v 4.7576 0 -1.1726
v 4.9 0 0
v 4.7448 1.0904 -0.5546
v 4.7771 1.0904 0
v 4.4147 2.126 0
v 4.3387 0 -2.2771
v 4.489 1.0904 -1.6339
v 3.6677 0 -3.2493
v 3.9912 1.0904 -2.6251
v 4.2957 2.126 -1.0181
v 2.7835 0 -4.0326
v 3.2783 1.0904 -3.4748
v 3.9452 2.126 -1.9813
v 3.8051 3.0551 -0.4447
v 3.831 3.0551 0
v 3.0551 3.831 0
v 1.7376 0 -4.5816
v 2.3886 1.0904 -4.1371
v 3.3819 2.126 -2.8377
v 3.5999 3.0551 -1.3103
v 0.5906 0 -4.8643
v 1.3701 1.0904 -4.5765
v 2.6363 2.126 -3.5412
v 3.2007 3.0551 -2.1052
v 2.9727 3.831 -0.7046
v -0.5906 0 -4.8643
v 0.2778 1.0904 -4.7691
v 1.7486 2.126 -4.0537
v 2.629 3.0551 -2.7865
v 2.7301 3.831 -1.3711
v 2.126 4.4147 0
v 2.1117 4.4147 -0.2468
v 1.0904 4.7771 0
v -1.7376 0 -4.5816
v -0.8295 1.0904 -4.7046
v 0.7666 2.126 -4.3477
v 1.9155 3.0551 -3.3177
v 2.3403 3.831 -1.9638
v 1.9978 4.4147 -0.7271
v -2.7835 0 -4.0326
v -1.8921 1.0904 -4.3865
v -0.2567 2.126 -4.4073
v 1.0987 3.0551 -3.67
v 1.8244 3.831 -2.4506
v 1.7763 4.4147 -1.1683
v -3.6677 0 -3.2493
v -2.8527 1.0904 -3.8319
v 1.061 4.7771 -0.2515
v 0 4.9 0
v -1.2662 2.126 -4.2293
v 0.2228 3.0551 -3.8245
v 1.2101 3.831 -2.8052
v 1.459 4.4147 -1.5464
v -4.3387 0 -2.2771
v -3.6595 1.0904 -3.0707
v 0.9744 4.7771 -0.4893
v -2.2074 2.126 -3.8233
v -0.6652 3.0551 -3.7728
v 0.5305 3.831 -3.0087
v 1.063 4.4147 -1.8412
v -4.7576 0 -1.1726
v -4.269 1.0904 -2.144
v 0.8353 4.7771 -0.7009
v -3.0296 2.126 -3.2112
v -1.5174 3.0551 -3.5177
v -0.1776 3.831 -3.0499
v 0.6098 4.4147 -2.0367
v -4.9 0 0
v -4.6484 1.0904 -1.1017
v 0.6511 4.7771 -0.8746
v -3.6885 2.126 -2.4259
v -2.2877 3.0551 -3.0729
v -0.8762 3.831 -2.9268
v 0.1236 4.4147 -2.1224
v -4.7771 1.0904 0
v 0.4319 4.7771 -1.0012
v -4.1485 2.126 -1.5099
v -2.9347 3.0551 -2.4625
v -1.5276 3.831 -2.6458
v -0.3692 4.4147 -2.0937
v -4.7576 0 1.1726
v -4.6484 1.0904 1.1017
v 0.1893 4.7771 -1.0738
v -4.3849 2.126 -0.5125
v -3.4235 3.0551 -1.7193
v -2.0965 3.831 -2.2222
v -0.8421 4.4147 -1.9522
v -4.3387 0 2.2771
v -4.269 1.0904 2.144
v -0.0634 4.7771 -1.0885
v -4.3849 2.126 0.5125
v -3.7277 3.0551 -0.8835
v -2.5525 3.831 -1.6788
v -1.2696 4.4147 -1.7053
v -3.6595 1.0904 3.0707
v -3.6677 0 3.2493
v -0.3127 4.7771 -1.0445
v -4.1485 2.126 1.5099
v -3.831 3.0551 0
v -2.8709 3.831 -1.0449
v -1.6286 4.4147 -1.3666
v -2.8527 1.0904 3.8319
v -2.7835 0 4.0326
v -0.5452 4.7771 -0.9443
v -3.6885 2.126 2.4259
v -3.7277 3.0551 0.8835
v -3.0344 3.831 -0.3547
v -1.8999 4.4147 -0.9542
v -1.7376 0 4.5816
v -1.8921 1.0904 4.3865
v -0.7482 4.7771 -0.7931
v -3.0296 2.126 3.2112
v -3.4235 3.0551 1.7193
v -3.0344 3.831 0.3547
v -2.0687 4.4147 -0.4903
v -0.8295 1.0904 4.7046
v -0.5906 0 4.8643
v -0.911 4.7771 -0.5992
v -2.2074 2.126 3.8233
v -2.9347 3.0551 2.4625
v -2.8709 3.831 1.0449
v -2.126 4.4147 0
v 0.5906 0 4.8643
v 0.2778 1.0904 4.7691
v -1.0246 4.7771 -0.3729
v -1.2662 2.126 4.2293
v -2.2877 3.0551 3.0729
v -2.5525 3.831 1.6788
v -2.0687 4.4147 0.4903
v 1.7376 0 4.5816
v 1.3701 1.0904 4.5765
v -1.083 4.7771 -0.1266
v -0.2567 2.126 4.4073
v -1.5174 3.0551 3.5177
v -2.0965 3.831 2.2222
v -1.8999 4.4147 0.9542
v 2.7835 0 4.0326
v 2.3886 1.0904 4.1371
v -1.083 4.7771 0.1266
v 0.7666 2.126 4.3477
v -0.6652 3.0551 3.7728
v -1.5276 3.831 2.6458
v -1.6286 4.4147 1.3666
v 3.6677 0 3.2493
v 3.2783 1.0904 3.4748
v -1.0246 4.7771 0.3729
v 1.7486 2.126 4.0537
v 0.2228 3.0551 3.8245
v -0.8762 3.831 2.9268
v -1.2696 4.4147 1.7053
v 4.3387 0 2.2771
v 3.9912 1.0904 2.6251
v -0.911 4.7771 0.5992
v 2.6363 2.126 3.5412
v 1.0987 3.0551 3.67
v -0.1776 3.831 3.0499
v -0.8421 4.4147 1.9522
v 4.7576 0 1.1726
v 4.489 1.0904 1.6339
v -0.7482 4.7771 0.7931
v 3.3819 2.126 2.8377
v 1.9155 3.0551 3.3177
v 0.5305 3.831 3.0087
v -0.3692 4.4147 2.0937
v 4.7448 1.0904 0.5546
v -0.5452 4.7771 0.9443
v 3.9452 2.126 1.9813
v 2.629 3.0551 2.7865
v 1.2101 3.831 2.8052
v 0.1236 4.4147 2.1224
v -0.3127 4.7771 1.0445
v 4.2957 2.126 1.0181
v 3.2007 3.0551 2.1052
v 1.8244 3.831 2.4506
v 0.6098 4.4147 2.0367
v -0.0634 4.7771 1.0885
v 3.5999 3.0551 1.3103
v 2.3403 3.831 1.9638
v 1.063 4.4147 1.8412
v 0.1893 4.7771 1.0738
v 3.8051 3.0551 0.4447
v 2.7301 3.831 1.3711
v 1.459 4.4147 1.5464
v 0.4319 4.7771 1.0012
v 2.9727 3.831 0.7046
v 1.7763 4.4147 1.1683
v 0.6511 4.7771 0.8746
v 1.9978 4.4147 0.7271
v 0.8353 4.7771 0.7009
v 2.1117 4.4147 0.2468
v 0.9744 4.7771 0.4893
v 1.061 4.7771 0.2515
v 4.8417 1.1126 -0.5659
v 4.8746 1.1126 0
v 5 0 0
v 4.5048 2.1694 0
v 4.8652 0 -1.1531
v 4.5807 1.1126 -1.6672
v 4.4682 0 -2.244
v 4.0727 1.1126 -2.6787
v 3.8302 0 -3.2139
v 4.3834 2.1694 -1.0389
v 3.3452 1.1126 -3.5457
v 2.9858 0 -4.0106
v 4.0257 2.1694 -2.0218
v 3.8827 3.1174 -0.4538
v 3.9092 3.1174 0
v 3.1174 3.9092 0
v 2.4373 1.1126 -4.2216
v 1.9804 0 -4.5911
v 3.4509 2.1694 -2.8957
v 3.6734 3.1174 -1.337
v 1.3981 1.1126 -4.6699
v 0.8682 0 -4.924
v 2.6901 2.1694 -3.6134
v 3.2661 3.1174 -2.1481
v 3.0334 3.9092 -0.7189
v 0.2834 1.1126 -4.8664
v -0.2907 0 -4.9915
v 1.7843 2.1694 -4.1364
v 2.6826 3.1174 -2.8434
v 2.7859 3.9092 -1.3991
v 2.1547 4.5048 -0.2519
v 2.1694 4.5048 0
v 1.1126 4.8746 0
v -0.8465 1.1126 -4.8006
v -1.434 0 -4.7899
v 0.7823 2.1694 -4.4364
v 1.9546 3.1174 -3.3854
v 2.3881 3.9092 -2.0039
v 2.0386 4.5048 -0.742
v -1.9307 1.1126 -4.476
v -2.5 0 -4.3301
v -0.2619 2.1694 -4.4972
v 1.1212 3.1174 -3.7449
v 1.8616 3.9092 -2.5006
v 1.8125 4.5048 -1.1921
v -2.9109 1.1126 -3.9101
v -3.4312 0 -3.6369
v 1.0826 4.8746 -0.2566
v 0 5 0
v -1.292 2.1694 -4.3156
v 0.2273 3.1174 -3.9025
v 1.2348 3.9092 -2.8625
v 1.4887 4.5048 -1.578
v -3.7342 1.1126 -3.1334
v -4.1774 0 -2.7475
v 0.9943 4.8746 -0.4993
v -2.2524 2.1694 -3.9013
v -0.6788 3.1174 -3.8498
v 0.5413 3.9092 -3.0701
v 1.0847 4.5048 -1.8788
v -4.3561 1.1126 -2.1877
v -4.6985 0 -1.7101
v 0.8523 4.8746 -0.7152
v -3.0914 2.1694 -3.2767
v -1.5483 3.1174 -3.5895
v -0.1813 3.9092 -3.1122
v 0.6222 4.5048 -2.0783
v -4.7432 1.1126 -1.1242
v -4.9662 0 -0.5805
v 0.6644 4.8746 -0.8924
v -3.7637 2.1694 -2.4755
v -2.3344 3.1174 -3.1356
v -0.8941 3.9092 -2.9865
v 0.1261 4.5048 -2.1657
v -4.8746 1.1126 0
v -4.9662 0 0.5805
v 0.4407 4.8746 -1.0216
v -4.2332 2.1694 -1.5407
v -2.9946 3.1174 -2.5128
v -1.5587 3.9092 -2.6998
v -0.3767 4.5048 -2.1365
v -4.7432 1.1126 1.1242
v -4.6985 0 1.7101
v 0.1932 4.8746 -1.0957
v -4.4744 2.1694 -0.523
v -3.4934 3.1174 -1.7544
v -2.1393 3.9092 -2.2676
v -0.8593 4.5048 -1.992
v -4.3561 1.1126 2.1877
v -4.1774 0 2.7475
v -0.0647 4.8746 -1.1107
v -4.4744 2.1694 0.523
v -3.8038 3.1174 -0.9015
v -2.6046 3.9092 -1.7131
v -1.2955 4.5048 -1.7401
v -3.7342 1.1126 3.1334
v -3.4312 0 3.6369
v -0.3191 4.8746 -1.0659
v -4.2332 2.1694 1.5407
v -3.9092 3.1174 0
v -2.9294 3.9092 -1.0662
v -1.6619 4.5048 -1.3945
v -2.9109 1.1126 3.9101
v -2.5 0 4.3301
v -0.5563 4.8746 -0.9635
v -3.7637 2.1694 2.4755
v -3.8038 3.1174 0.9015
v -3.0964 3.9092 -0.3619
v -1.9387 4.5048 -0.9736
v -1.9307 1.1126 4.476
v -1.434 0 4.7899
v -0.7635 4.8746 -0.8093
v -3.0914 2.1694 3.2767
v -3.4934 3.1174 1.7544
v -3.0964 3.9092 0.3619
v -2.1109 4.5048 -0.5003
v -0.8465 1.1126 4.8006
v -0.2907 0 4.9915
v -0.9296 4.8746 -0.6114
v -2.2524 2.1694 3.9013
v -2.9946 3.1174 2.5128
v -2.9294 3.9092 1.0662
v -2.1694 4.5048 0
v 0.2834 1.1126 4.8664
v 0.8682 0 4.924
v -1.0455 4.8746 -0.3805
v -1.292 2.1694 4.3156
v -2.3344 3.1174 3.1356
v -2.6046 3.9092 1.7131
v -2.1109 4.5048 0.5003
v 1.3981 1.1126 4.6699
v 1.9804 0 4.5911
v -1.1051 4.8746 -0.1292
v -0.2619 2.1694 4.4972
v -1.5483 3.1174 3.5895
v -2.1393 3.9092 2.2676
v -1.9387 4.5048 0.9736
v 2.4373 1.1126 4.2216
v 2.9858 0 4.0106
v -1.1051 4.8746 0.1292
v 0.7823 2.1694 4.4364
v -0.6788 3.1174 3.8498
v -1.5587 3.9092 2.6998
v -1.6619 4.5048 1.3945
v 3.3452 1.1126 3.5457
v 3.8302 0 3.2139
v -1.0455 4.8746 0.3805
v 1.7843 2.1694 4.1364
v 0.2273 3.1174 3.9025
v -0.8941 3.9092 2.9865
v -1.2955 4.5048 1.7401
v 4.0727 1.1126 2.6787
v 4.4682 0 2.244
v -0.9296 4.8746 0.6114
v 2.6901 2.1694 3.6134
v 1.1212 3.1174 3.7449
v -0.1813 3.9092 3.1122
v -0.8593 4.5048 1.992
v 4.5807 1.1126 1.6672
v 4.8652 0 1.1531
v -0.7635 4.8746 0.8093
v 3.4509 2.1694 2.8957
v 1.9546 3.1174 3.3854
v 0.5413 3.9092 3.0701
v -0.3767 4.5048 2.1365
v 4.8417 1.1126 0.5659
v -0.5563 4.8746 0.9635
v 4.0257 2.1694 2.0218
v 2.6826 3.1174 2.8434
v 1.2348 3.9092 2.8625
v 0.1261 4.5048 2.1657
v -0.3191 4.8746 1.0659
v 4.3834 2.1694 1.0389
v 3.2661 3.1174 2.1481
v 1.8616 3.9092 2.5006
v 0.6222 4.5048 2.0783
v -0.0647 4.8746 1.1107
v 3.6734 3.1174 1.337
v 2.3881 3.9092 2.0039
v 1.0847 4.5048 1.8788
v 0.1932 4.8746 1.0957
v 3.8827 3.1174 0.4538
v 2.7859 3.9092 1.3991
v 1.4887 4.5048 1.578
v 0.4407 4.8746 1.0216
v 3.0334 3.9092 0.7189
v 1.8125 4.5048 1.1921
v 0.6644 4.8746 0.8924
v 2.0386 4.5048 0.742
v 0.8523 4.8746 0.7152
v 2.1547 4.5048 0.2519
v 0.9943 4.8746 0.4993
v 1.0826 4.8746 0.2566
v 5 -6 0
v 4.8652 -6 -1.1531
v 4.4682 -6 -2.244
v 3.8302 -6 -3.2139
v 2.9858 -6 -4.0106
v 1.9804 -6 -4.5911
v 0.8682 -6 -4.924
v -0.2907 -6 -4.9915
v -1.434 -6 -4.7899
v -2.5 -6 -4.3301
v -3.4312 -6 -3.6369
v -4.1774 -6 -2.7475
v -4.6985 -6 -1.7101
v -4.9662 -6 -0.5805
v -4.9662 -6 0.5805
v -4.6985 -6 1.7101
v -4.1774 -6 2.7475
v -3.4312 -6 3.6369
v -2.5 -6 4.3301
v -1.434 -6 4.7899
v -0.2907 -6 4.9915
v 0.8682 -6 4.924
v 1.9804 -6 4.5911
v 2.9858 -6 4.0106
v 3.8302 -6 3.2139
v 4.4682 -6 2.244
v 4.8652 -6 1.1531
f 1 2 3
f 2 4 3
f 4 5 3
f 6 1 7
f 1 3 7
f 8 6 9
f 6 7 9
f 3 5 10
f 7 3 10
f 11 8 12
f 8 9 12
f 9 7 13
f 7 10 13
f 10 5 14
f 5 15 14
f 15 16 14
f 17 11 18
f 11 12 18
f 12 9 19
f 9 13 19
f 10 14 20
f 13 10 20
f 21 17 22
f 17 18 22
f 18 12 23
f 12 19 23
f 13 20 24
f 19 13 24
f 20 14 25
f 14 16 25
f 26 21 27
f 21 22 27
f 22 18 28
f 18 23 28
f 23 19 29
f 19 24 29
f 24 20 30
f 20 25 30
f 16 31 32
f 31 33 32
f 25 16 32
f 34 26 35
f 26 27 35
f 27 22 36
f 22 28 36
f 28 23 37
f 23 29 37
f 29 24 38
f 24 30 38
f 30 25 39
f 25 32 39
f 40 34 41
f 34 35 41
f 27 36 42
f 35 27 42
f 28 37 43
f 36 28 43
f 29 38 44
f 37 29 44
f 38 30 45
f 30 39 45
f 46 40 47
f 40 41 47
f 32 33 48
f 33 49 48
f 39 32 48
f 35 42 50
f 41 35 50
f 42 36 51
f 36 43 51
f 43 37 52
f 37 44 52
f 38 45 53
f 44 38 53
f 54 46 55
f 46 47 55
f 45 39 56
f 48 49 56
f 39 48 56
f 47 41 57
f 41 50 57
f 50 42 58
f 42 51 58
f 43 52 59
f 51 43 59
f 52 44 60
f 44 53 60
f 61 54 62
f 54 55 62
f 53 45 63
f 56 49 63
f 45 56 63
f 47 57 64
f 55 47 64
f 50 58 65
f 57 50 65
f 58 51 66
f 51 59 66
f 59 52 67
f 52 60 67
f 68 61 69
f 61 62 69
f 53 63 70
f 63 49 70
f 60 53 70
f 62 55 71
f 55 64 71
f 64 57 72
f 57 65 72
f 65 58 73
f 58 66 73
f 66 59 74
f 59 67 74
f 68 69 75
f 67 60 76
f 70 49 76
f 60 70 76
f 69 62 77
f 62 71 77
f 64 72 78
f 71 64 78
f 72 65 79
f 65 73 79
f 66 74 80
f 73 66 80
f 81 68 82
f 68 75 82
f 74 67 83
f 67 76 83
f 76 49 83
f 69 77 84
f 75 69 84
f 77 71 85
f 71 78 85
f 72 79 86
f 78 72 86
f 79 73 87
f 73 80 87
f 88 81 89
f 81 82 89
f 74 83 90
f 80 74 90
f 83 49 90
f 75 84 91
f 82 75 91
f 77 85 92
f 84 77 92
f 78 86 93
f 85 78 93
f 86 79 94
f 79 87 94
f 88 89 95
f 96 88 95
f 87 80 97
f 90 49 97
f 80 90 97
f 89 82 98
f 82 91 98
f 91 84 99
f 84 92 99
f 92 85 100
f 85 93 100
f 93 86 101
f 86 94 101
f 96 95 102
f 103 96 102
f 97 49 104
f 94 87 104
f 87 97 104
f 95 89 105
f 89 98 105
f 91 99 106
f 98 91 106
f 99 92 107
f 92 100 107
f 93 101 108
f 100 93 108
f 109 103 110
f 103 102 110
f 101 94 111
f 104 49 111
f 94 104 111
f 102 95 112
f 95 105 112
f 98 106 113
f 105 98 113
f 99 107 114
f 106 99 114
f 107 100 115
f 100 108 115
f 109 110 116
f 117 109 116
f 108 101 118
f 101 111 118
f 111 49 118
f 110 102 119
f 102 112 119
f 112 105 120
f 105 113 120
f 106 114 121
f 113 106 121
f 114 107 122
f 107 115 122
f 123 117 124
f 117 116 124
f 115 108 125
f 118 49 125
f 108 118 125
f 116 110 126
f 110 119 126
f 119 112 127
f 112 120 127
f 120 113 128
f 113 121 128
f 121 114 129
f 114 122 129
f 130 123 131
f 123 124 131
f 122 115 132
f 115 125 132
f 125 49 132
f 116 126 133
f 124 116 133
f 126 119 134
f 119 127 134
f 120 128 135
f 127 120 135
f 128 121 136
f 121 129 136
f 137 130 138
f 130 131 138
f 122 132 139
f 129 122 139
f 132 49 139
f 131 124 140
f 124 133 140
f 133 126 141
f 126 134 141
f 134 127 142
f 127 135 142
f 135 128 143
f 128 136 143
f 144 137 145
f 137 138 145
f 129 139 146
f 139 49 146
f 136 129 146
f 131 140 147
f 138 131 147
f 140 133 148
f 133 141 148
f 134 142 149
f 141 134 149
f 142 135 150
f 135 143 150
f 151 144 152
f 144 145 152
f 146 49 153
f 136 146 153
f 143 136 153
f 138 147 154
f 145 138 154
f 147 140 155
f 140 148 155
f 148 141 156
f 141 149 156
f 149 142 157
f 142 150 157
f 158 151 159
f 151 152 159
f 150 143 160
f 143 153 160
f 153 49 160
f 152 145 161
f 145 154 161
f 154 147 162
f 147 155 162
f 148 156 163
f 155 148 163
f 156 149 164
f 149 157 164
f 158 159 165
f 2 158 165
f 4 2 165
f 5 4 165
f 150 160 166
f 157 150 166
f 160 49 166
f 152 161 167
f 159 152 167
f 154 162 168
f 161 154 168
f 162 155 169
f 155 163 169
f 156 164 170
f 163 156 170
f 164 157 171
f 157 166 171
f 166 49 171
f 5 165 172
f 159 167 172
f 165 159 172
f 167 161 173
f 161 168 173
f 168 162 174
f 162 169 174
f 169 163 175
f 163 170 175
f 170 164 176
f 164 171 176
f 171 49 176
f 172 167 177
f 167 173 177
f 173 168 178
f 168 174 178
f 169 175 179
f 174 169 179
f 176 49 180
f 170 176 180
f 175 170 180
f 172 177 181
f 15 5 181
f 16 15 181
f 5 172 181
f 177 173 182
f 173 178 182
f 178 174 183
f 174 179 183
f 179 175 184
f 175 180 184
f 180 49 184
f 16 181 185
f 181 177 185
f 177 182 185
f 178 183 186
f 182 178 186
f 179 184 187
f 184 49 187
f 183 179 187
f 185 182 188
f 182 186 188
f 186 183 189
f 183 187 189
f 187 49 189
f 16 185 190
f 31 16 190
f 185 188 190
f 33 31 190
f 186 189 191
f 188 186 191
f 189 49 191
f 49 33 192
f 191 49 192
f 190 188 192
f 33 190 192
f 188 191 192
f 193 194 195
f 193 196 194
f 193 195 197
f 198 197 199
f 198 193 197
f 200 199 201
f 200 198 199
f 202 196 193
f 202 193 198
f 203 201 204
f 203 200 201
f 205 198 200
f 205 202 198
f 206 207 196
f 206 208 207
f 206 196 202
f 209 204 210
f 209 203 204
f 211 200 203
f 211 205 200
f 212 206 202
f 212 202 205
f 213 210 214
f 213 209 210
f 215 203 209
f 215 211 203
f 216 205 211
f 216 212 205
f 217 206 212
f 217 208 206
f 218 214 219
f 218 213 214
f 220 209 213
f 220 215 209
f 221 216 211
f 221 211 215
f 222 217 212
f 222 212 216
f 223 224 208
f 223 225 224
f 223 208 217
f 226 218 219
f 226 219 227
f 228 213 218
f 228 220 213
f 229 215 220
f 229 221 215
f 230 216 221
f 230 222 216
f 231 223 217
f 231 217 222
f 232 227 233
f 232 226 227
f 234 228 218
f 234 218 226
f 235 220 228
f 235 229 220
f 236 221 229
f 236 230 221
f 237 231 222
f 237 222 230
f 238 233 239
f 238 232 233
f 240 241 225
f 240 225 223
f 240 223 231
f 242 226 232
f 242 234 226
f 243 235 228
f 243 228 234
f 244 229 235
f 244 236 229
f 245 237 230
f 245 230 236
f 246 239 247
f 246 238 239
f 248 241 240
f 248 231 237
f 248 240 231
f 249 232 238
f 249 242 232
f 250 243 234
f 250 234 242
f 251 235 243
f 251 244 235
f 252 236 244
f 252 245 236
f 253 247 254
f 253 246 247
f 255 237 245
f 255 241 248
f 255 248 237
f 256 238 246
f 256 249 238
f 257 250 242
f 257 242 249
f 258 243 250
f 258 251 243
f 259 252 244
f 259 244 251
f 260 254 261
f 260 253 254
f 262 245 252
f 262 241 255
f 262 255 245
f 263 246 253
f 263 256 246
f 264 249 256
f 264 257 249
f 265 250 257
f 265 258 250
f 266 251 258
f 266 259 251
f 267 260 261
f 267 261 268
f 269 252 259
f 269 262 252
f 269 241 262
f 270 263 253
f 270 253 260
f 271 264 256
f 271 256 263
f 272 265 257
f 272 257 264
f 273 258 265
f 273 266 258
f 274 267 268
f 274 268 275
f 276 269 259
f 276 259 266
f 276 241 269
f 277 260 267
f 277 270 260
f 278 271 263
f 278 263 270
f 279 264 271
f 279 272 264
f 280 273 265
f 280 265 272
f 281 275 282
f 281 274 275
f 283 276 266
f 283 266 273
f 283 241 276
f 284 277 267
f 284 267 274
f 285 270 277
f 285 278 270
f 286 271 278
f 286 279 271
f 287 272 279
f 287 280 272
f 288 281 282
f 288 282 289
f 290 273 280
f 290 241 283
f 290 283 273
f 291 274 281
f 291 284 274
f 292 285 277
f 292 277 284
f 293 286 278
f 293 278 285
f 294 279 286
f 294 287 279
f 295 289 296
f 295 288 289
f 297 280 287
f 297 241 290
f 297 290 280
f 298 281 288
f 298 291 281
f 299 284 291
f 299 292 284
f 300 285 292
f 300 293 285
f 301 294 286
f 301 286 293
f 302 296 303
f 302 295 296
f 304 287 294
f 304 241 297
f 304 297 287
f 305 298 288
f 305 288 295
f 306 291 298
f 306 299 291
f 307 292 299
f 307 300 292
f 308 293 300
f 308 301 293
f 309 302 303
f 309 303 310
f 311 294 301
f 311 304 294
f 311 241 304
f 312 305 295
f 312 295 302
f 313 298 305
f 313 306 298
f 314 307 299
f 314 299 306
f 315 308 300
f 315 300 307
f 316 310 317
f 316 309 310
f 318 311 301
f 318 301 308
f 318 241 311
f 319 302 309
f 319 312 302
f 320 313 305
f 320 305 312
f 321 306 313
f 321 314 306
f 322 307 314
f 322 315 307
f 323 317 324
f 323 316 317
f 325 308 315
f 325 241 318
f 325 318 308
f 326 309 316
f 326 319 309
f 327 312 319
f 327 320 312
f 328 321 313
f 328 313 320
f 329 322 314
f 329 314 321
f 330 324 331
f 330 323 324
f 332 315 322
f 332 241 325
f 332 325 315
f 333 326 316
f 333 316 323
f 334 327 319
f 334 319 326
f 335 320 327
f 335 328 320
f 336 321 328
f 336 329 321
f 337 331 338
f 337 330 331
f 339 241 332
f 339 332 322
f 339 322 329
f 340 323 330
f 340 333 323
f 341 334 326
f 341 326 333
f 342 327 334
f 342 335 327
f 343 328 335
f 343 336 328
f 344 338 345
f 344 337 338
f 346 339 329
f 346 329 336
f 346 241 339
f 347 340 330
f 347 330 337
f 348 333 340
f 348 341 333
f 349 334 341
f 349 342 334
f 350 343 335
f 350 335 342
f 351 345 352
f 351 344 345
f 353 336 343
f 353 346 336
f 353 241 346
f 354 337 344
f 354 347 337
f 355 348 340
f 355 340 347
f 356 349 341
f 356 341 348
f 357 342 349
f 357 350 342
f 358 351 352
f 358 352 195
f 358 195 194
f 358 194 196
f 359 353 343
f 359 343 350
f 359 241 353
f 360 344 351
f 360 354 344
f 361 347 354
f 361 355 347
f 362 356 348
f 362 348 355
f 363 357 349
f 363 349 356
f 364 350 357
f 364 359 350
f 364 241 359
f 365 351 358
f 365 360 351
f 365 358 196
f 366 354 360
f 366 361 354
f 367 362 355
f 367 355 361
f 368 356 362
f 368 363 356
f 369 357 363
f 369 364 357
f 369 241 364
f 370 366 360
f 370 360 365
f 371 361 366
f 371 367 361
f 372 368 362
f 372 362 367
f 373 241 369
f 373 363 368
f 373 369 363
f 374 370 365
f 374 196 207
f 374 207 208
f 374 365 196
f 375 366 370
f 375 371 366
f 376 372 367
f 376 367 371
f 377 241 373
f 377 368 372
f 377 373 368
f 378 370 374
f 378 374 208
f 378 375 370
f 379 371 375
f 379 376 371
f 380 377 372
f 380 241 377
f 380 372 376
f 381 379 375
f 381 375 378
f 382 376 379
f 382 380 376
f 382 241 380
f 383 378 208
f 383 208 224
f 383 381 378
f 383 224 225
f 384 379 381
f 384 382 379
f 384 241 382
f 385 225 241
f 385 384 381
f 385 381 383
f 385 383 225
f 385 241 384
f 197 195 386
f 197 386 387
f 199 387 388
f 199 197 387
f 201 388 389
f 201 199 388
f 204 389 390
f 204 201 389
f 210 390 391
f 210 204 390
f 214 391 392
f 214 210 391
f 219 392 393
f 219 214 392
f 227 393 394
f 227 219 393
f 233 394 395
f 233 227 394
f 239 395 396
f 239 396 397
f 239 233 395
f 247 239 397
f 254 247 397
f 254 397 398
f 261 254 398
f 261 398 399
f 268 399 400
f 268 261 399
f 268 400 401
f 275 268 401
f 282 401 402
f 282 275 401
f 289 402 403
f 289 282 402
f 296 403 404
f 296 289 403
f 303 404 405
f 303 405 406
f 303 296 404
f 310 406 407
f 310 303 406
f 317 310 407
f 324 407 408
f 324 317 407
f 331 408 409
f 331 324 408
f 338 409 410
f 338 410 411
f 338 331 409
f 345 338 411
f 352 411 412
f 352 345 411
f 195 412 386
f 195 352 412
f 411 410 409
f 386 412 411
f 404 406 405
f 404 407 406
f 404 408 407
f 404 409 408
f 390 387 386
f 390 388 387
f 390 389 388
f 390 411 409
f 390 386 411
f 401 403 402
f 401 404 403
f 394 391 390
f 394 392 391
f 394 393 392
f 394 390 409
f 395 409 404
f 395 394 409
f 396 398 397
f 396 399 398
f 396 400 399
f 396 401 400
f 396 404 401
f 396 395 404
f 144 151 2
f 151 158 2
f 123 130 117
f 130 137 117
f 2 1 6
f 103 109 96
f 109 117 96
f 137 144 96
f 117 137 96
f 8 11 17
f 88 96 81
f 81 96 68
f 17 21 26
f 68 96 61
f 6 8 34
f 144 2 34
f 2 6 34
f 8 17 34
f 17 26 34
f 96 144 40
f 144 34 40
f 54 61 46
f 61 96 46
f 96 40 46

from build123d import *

# Parameters (mm, degrees)
SHELL1_T  = -0.1
SKETCH4_W = 5
SKETCH4_H = 6


with BuildPart() as part:
    # Sketch3 → Revolve1 (revolve)
    with BuildSketch(Plane.XY):
        with BuildLine():
            Line((0, 0), (5, 0))
            ThreePointArc((5, 0), (3.535533906, 3.535533906), (0, 5))
            Line((0, 5), (0, 0))
        make_face()
    revolve(axis=Axis((0, 0, 0), (0, 1, 0)))

    # Shell1
    shell1_openings = [part.faces().sort_by_distance(p)[0] for p in [
        (0, 0, 0),
    ]]
    offset(amount=SHELL1_T, openings=shell1_openings, kind=Kind.INTERSECTION)

    # Sketch4 → Revolve2 (revolve)
    with BuildSketch(Plane.XY):
        with Locations((2.5, -3)):
            Rectangle(SKETCH4_W, SKETCH4_H)
    revolve(axis=Axis((0, -6, 0), (0, 1, 0)))


solid = part.part
